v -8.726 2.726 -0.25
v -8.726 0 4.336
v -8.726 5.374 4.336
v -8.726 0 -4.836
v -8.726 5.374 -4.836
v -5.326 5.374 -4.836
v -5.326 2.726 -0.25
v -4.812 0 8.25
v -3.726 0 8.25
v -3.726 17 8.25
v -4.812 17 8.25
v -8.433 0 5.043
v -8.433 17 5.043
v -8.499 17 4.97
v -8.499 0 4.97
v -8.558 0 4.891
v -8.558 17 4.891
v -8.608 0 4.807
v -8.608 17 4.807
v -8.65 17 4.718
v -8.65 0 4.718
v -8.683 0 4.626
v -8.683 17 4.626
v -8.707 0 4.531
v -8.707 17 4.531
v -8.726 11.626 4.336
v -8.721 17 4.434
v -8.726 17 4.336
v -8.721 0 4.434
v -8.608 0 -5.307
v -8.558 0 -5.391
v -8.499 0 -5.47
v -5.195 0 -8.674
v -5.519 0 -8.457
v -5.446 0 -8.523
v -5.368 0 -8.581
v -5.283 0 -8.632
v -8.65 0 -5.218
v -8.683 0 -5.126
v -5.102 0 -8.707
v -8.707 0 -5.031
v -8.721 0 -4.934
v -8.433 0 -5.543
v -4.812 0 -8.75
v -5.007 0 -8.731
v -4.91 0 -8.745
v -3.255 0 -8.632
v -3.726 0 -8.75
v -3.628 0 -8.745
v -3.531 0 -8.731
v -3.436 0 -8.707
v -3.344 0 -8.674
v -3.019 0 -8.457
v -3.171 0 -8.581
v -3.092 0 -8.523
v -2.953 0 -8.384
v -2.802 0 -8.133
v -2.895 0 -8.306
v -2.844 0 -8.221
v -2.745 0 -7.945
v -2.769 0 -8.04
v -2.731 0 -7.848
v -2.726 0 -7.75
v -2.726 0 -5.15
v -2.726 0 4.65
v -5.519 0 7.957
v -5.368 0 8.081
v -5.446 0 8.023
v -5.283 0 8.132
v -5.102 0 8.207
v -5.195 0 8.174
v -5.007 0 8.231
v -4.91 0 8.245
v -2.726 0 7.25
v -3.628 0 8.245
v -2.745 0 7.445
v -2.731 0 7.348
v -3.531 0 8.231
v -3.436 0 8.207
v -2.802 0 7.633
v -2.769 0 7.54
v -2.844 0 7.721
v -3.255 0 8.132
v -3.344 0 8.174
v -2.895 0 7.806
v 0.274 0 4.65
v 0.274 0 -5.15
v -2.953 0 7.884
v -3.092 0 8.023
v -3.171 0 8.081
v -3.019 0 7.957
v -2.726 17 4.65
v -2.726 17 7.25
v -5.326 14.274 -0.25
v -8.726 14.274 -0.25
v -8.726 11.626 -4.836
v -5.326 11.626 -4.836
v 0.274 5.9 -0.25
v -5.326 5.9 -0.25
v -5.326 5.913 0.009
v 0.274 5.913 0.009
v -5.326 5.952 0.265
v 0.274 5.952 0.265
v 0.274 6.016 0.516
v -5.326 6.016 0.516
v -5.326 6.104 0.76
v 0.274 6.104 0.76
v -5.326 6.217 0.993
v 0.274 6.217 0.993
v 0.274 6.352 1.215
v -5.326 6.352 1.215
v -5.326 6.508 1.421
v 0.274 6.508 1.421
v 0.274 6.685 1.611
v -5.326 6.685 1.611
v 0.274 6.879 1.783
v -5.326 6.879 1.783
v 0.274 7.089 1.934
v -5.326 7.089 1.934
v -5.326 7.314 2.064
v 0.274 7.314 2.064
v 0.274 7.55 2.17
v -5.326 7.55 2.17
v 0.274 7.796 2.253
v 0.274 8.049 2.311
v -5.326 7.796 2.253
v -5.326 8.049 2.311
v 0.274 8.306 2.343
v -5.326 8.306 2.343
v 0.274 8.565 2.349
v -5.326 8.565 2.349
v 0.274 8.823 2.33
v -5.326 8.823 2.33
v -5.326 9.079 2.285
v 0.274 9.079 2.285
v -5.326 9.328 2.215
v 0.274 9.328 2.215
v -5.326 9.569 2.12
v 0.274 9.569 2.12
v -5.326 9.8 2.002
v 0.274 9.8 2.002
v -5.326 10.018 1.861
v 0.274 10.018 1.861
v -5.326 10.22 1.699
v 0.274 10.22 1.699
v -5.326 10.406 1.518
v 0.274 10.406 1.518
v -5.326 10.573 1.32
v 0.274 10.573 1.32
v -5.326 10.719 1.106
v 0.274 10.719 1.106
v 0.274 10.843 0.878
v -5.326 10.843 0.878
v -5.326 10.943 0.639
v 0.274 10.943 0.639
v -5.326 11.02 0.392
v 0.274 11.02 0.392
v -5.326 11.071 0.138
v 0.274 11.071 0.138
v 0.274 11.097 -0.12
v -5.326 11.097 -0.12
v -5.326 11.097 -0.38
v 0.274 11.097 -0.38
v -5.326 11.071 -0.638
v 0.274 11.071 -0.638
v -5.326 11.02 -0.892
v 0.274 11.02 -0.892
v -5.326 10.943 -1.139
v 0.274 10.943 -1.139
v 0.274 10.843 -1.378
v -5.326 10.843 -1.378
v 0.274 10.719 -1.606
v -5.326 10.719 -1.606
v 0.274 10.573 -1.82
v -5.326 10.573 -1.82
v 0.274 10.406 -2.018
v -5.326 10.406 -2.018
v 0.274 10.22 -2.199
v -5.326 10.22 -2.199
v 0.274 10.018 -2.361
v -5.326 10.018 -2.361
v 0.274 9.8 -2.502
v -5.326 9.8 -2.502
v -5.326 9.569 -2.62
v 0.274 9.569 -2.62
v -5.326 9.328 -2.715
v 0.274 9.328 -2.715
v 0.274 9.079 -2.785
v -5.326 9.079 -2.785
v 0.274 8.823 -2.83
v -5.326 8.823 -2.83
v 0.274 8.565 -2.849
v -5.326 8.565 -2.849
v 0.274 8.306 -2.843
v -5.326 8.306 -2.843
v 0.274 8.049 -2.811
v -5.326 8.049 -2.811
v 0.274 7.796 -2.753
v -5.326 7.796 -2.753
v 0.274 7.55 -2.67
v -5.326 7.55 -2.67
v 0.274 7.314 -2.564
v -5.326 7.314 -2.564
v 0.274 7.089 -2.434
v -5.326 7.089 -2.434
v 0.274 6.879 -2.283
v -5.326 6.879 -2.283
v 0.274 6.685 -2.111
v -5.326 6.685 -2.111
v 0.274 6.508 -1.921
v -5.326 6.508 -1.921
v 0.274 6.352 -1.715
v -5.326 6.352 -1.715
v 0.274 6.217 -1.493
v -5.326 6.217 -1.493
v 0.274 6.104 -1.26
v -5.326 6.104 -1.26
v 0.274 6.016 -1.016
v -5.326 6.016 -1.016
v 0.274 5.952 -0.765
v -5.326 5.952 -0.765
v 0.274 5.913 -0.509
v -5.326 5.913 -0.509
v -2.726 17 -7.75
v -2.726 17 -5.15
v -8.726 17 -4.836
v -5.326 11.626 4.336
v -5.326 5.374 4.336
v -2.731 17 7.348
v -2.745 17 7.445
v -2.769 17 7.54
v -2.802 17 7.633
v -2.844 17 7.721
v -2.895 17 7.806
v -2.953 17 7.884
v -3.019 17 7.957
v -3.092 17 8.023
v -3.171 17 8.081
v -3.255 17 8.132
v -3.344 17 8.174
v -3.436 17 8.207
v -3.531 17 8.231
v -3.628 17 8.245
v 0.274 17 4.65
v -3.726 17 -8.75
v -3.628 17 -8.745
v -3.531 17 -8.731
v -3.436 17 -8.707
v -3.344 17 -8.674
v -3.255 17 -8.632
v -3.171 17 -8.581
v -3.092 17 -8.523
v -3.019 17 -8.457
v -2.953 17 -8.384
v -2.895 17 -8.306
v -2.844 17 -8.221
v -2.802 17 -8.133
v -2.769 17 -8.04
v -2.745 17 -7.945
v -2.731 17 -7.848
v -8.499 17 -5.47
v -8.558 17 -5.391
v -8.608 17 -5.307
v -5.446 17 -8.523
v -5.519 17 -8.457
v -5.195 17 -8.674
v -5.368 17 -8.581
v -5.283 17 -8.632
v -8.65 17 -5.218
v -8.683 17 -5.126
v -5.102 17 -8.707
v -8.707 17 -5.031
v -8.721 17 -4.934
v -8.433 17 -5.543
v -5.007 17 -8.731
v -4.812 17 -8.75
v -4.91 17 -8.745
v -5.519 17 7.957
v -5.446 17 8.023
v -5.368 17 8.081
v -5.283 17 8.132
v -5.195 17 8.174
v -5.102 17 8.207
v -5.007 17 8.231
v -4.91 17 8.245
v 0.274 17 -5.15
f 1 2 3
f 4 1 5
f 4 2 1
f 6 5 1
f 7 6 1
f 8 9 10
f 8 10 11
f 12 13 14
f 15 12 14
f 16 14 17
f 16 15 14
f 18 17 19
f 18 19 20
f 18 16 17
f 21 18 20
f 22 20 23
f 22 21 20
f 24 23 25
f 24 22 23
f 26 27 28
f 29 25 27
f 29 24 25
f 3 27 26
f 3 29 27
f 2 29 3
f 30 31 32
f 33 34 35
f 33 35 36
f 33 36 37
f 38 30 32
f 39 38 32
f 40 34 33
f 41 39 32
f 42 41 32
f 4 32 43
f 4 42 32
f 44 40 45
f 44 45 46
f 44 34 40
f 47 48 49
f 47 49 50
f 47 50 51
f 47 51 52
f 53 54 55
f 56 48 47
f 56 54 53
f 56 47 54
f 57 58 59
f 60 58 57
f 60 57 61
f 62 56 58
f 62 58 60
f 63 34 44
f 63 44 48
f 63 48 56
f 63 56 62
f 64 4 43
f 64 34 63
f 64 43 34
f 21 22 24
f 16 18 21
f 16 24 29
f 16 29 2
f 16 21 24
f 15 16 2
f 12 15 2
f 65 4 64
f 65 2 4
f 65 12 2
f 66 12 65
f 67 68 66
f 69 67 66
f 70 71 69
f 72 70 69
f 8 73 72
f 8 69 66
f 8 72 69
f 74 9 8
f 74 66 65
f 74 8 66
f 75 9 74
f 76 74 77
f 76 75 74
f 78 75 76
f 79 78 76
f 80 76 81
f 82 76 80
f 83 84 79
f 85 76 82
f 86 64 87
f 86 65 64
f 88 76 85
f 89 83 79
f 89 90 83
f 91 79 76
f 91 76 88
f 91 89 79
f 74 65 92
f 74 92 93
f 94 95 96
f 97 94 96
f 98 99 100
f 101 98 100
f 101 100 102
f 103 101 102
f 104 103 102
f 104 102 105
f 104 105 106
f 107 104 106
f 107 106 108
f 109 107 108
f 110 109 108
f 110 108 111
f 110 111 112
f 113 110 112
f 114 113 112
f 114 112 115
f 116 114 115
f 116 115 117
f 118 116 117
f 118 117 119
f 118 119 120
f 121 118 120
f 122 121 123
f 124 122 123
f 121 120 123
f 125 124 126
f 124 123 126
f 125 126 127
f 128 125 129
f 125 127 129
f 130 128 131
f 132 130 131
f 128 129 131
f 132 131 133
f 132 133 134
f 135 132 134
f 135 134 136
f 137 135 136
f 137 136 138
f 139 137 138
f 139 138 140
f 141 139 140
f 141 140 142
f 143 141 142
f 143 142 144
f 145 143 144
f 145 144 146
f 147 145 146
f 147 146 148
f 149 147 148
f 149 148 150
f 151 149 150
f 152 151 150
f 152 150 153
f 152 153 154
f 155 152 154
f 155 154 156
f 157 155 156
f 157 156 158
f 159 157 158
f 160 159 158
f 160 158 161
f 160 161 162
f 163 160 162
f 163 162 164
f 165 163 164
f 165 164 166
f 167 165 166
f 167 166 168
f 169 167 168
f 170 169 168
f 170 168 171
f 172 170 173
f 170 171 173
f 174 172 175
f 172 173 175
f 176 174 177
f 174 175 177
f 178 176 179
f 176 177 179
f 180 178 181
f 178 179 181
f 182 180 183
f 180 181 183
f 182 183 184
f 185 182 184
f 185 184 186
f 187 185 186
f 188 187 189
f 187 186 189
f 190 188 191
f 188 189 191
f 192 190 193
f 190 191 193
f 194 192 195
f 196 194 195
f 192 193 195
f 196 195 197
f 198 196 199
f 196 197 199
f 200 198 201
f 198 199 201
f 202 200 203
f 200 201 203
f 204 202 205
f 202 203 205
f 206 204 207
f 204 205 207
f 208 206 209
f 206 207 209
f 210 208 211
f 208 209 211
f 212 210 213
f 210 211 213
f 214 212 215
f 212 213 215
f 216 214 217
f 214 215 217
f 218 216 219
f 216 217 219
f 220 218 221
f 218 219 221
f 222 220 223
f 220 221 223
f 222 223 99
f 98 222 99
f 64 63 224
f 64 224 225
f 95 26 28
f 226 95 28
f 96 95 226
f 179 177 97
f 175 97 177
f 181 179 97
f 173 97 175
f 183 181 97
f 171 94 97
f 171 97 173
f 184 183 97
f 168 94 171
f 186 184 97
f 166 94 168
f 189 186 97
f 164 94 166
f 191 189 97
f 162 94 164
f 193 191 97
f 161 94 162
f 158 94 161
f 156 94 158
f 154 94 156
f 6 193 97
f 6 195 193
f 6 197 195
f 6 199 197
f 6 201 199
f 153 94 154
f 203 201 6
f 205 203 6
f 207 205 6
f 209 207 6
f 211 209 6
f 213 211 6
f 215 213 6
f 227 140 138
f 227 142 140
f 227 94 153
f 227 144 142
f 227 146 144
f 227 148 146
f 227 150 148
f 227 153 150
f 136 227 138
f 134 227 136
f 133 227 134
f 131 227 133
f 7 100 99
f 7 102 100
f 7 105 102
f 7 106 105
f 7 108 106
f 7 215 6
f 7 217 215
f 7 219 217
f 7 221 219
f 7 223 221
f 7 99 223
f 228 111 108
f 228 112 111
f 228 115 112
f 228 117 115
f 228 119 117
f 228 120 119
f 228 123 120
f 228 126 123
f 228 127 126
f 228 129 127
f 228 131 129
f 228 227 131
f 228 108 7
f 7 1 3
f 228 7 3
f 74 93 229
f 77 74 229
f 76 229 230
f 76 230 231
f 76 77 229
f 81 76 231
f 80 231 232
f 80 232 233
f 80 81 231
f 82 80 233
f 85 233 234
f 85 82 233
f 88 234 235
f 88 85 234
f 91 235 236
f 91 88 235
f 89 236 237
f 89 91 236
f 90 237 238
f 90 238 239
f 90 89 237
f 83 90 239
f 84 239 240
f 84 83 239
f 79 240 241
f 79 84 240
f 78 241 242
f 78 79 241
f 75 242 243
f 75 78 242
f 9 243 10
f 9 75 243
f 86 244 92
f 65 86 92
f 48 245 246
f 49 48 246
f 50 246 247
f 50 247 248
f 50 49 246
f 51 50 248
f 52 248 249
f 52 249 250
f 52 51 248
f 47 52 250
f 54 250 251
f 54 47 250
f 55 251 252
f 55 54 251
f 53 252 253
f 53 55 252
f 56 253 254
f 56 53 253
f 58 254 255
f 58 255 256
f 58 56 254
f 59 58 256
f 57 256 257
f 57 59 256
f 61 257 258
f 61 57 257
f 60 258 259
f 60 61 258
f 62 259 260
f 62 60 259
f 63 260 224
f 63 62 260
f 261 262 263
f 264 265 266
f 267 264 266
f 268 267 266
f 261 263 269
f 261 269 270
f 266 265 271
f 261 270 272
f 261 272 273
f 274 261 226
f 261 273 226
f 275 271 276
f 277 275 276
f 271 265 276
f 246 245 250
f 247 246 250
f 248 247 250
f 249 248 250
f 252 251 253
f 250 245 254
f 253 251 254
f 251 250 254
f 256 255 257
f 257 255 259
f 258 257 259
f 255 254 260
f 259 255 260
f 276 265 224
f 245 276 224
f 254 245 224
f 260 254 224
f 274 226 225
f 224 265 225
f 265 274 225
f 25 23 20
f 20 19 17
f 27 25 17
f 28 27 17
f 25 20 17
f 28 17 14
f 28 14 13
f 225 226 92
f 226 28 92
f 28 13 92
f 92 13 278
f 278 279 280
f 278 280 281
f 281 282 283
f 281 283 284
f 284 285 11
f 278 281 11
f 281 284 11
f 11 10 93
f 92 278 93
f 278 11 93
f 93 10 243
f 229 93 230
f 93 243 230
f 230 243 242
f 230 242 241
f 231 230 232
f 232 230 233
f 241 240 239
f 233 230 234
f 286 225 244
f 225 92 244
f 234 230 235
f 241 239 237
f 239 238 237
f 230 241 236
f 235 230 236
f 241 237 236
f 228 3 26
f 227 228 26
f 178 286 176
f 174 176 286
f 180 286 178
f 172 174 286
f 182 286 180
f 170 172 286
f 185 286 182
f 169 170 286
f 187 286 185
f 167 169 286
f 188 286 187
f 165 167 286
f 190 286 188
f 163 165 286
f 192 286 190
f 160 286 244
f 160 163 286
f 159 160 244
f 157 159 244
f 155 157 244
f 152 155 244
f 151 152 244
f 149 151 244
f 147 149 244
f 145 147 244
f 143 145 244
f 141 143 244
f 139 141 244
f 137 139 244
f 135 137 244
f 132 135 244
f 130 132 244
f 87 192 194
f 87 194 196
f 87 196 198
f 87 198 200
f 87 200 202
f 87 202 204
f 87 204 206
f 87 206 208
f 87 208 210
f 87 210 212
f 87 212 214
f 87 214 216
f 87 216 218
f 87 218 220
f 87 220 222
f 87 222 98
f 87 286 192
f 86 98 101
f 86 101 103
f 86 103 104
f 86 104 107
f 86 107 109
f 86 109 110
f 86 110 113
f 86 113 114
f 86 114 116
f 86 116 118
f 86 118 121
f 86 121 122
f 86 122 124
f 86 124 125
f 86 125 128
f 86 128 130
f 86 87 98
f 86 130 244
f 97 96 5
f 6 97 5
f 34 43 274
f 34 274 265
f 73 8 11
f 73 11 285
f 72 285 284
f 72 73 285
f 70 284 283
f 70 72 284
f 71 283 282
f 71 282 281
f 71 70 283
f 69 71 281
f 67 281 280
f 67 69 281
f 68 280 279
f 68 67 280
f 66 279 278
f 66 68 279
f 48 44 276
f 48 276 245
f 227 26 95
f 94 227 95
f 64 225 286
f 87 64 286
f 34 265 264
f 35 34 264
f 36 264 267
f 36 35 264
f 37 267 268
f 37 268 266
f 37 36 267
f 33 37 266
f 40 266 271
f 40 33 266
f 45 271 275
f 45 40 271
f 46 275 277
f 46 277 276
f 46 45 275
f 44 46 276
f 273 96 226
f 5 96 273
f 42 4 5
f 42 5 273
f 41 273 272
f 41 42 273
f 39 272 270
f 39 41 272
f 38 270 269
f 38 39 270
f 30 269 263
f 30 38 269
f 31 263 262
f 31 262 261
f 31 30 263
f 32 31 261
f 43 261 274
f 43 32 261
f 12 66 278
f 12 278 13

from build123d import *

# Parameters (mm, degrees)
F1_DEPTH = 17
F2_R     = 2.6
F3_DEPTH = 3.4
F4_DEPTH = 9.001


# Not quite as in the source:
# - ends of sketch curves that miss each other by under 0.0002 mm in the source are joined


with BuildPart() as f1:
    # F0 (on Front) → F1 (new body)
    with BuildSketch(Plane.XZ):
        with BuildLine():
            ThreePointArc((-8.4332967812, 5.0428927812), (-8.6500695325, 4.7184694324), (-8.72619, 4.335786))
            Line((-8.72619, 4.335786), (-8.72619, -4.835786))
            ThreePointArc((-8.72619, -4.835786), (-8.6500695325, -5.2184694324), (-8.4332967812, -5.5428927812))
            Line((-8.4332967812, -5.5428927812), (-5.519083, -8.457107))
            ThreePointArc((-5.519083, -8.457107), (-5.1946594324, -8.6738795325), (-4.811976, -8.75))
            Line((-4.811976, -8.75), (-3.72619, -8.75))
            ThreePointArc((-3.72619, -8.75), (-3.0190832188, -8.4571067812), (-2.72619, -7.75))
            Line((-2.72619, -7.75), (-2.72619, -5.15))
            Line((-2.72619, -5.15), (0.27381, -5.15))
            Line((0.27381, -5.15), (0.27381, 4.65))
            Line((0.27381, 4.65), (-2.72619, 4.65))
            Line((-2.72619, 4.65), (-2.72619, 7.25))
            ThreePointArc((-2.72619, 7.25), (-3.0190832188, 7.9571067812), (-3.72619, 8.25))
            Line((-3.72619, 8.25), (-4.811976, 8.25))
            ThreePointArc((-4.811976, 8.25), (-5.1946594324, 8.1738795325), (-5.5190827812, 7.9571067812))
            Line((-5.5190827812, 7.9571067812), (-8.4332967812, 5.0428927812))
        make_face()
    extrude(amount=-F1_DEPTH)

    # F2 (on face) → F3 (cut)
    with BuildSketch(Plane(origin=(-8.72619, 0, 0), x_dir=(0, -1, 0), z_dir=(-1, 0, 0))):
        Polygon((-11.6258979104, -4.835786), (-5.3741020896, -4.835786), (-2.7264973081, -0.25), (-5.3741020896, 4.335786), (-11.6258979104, 4.335786), (-14.2735026919, -0.25), align=None)
        with Locations((-8.5, -0.25)):
            Circle(F2_R, mode=Mode.SUBTRACT)
        with Locations((-8.5, -0.25)):
            Circle(F2_R)
    extrude(amount=-F3_DEPTH, mode=Mode.SUBTRACT)

    # F2 (on face) → F4 (cut, through all)
    with BuildSketch(Plane(origin=(-8.72619, 0, 0), x_dir=(0, -1, 0), z_dir=(-1, 0, 0))):
        with Locations((-8.5, -0.25)):
            Circle(F2_R)
    extrude(amount=-F4_DEPTH, mode=Mode.SUBTRACT)


solid = f1.part
